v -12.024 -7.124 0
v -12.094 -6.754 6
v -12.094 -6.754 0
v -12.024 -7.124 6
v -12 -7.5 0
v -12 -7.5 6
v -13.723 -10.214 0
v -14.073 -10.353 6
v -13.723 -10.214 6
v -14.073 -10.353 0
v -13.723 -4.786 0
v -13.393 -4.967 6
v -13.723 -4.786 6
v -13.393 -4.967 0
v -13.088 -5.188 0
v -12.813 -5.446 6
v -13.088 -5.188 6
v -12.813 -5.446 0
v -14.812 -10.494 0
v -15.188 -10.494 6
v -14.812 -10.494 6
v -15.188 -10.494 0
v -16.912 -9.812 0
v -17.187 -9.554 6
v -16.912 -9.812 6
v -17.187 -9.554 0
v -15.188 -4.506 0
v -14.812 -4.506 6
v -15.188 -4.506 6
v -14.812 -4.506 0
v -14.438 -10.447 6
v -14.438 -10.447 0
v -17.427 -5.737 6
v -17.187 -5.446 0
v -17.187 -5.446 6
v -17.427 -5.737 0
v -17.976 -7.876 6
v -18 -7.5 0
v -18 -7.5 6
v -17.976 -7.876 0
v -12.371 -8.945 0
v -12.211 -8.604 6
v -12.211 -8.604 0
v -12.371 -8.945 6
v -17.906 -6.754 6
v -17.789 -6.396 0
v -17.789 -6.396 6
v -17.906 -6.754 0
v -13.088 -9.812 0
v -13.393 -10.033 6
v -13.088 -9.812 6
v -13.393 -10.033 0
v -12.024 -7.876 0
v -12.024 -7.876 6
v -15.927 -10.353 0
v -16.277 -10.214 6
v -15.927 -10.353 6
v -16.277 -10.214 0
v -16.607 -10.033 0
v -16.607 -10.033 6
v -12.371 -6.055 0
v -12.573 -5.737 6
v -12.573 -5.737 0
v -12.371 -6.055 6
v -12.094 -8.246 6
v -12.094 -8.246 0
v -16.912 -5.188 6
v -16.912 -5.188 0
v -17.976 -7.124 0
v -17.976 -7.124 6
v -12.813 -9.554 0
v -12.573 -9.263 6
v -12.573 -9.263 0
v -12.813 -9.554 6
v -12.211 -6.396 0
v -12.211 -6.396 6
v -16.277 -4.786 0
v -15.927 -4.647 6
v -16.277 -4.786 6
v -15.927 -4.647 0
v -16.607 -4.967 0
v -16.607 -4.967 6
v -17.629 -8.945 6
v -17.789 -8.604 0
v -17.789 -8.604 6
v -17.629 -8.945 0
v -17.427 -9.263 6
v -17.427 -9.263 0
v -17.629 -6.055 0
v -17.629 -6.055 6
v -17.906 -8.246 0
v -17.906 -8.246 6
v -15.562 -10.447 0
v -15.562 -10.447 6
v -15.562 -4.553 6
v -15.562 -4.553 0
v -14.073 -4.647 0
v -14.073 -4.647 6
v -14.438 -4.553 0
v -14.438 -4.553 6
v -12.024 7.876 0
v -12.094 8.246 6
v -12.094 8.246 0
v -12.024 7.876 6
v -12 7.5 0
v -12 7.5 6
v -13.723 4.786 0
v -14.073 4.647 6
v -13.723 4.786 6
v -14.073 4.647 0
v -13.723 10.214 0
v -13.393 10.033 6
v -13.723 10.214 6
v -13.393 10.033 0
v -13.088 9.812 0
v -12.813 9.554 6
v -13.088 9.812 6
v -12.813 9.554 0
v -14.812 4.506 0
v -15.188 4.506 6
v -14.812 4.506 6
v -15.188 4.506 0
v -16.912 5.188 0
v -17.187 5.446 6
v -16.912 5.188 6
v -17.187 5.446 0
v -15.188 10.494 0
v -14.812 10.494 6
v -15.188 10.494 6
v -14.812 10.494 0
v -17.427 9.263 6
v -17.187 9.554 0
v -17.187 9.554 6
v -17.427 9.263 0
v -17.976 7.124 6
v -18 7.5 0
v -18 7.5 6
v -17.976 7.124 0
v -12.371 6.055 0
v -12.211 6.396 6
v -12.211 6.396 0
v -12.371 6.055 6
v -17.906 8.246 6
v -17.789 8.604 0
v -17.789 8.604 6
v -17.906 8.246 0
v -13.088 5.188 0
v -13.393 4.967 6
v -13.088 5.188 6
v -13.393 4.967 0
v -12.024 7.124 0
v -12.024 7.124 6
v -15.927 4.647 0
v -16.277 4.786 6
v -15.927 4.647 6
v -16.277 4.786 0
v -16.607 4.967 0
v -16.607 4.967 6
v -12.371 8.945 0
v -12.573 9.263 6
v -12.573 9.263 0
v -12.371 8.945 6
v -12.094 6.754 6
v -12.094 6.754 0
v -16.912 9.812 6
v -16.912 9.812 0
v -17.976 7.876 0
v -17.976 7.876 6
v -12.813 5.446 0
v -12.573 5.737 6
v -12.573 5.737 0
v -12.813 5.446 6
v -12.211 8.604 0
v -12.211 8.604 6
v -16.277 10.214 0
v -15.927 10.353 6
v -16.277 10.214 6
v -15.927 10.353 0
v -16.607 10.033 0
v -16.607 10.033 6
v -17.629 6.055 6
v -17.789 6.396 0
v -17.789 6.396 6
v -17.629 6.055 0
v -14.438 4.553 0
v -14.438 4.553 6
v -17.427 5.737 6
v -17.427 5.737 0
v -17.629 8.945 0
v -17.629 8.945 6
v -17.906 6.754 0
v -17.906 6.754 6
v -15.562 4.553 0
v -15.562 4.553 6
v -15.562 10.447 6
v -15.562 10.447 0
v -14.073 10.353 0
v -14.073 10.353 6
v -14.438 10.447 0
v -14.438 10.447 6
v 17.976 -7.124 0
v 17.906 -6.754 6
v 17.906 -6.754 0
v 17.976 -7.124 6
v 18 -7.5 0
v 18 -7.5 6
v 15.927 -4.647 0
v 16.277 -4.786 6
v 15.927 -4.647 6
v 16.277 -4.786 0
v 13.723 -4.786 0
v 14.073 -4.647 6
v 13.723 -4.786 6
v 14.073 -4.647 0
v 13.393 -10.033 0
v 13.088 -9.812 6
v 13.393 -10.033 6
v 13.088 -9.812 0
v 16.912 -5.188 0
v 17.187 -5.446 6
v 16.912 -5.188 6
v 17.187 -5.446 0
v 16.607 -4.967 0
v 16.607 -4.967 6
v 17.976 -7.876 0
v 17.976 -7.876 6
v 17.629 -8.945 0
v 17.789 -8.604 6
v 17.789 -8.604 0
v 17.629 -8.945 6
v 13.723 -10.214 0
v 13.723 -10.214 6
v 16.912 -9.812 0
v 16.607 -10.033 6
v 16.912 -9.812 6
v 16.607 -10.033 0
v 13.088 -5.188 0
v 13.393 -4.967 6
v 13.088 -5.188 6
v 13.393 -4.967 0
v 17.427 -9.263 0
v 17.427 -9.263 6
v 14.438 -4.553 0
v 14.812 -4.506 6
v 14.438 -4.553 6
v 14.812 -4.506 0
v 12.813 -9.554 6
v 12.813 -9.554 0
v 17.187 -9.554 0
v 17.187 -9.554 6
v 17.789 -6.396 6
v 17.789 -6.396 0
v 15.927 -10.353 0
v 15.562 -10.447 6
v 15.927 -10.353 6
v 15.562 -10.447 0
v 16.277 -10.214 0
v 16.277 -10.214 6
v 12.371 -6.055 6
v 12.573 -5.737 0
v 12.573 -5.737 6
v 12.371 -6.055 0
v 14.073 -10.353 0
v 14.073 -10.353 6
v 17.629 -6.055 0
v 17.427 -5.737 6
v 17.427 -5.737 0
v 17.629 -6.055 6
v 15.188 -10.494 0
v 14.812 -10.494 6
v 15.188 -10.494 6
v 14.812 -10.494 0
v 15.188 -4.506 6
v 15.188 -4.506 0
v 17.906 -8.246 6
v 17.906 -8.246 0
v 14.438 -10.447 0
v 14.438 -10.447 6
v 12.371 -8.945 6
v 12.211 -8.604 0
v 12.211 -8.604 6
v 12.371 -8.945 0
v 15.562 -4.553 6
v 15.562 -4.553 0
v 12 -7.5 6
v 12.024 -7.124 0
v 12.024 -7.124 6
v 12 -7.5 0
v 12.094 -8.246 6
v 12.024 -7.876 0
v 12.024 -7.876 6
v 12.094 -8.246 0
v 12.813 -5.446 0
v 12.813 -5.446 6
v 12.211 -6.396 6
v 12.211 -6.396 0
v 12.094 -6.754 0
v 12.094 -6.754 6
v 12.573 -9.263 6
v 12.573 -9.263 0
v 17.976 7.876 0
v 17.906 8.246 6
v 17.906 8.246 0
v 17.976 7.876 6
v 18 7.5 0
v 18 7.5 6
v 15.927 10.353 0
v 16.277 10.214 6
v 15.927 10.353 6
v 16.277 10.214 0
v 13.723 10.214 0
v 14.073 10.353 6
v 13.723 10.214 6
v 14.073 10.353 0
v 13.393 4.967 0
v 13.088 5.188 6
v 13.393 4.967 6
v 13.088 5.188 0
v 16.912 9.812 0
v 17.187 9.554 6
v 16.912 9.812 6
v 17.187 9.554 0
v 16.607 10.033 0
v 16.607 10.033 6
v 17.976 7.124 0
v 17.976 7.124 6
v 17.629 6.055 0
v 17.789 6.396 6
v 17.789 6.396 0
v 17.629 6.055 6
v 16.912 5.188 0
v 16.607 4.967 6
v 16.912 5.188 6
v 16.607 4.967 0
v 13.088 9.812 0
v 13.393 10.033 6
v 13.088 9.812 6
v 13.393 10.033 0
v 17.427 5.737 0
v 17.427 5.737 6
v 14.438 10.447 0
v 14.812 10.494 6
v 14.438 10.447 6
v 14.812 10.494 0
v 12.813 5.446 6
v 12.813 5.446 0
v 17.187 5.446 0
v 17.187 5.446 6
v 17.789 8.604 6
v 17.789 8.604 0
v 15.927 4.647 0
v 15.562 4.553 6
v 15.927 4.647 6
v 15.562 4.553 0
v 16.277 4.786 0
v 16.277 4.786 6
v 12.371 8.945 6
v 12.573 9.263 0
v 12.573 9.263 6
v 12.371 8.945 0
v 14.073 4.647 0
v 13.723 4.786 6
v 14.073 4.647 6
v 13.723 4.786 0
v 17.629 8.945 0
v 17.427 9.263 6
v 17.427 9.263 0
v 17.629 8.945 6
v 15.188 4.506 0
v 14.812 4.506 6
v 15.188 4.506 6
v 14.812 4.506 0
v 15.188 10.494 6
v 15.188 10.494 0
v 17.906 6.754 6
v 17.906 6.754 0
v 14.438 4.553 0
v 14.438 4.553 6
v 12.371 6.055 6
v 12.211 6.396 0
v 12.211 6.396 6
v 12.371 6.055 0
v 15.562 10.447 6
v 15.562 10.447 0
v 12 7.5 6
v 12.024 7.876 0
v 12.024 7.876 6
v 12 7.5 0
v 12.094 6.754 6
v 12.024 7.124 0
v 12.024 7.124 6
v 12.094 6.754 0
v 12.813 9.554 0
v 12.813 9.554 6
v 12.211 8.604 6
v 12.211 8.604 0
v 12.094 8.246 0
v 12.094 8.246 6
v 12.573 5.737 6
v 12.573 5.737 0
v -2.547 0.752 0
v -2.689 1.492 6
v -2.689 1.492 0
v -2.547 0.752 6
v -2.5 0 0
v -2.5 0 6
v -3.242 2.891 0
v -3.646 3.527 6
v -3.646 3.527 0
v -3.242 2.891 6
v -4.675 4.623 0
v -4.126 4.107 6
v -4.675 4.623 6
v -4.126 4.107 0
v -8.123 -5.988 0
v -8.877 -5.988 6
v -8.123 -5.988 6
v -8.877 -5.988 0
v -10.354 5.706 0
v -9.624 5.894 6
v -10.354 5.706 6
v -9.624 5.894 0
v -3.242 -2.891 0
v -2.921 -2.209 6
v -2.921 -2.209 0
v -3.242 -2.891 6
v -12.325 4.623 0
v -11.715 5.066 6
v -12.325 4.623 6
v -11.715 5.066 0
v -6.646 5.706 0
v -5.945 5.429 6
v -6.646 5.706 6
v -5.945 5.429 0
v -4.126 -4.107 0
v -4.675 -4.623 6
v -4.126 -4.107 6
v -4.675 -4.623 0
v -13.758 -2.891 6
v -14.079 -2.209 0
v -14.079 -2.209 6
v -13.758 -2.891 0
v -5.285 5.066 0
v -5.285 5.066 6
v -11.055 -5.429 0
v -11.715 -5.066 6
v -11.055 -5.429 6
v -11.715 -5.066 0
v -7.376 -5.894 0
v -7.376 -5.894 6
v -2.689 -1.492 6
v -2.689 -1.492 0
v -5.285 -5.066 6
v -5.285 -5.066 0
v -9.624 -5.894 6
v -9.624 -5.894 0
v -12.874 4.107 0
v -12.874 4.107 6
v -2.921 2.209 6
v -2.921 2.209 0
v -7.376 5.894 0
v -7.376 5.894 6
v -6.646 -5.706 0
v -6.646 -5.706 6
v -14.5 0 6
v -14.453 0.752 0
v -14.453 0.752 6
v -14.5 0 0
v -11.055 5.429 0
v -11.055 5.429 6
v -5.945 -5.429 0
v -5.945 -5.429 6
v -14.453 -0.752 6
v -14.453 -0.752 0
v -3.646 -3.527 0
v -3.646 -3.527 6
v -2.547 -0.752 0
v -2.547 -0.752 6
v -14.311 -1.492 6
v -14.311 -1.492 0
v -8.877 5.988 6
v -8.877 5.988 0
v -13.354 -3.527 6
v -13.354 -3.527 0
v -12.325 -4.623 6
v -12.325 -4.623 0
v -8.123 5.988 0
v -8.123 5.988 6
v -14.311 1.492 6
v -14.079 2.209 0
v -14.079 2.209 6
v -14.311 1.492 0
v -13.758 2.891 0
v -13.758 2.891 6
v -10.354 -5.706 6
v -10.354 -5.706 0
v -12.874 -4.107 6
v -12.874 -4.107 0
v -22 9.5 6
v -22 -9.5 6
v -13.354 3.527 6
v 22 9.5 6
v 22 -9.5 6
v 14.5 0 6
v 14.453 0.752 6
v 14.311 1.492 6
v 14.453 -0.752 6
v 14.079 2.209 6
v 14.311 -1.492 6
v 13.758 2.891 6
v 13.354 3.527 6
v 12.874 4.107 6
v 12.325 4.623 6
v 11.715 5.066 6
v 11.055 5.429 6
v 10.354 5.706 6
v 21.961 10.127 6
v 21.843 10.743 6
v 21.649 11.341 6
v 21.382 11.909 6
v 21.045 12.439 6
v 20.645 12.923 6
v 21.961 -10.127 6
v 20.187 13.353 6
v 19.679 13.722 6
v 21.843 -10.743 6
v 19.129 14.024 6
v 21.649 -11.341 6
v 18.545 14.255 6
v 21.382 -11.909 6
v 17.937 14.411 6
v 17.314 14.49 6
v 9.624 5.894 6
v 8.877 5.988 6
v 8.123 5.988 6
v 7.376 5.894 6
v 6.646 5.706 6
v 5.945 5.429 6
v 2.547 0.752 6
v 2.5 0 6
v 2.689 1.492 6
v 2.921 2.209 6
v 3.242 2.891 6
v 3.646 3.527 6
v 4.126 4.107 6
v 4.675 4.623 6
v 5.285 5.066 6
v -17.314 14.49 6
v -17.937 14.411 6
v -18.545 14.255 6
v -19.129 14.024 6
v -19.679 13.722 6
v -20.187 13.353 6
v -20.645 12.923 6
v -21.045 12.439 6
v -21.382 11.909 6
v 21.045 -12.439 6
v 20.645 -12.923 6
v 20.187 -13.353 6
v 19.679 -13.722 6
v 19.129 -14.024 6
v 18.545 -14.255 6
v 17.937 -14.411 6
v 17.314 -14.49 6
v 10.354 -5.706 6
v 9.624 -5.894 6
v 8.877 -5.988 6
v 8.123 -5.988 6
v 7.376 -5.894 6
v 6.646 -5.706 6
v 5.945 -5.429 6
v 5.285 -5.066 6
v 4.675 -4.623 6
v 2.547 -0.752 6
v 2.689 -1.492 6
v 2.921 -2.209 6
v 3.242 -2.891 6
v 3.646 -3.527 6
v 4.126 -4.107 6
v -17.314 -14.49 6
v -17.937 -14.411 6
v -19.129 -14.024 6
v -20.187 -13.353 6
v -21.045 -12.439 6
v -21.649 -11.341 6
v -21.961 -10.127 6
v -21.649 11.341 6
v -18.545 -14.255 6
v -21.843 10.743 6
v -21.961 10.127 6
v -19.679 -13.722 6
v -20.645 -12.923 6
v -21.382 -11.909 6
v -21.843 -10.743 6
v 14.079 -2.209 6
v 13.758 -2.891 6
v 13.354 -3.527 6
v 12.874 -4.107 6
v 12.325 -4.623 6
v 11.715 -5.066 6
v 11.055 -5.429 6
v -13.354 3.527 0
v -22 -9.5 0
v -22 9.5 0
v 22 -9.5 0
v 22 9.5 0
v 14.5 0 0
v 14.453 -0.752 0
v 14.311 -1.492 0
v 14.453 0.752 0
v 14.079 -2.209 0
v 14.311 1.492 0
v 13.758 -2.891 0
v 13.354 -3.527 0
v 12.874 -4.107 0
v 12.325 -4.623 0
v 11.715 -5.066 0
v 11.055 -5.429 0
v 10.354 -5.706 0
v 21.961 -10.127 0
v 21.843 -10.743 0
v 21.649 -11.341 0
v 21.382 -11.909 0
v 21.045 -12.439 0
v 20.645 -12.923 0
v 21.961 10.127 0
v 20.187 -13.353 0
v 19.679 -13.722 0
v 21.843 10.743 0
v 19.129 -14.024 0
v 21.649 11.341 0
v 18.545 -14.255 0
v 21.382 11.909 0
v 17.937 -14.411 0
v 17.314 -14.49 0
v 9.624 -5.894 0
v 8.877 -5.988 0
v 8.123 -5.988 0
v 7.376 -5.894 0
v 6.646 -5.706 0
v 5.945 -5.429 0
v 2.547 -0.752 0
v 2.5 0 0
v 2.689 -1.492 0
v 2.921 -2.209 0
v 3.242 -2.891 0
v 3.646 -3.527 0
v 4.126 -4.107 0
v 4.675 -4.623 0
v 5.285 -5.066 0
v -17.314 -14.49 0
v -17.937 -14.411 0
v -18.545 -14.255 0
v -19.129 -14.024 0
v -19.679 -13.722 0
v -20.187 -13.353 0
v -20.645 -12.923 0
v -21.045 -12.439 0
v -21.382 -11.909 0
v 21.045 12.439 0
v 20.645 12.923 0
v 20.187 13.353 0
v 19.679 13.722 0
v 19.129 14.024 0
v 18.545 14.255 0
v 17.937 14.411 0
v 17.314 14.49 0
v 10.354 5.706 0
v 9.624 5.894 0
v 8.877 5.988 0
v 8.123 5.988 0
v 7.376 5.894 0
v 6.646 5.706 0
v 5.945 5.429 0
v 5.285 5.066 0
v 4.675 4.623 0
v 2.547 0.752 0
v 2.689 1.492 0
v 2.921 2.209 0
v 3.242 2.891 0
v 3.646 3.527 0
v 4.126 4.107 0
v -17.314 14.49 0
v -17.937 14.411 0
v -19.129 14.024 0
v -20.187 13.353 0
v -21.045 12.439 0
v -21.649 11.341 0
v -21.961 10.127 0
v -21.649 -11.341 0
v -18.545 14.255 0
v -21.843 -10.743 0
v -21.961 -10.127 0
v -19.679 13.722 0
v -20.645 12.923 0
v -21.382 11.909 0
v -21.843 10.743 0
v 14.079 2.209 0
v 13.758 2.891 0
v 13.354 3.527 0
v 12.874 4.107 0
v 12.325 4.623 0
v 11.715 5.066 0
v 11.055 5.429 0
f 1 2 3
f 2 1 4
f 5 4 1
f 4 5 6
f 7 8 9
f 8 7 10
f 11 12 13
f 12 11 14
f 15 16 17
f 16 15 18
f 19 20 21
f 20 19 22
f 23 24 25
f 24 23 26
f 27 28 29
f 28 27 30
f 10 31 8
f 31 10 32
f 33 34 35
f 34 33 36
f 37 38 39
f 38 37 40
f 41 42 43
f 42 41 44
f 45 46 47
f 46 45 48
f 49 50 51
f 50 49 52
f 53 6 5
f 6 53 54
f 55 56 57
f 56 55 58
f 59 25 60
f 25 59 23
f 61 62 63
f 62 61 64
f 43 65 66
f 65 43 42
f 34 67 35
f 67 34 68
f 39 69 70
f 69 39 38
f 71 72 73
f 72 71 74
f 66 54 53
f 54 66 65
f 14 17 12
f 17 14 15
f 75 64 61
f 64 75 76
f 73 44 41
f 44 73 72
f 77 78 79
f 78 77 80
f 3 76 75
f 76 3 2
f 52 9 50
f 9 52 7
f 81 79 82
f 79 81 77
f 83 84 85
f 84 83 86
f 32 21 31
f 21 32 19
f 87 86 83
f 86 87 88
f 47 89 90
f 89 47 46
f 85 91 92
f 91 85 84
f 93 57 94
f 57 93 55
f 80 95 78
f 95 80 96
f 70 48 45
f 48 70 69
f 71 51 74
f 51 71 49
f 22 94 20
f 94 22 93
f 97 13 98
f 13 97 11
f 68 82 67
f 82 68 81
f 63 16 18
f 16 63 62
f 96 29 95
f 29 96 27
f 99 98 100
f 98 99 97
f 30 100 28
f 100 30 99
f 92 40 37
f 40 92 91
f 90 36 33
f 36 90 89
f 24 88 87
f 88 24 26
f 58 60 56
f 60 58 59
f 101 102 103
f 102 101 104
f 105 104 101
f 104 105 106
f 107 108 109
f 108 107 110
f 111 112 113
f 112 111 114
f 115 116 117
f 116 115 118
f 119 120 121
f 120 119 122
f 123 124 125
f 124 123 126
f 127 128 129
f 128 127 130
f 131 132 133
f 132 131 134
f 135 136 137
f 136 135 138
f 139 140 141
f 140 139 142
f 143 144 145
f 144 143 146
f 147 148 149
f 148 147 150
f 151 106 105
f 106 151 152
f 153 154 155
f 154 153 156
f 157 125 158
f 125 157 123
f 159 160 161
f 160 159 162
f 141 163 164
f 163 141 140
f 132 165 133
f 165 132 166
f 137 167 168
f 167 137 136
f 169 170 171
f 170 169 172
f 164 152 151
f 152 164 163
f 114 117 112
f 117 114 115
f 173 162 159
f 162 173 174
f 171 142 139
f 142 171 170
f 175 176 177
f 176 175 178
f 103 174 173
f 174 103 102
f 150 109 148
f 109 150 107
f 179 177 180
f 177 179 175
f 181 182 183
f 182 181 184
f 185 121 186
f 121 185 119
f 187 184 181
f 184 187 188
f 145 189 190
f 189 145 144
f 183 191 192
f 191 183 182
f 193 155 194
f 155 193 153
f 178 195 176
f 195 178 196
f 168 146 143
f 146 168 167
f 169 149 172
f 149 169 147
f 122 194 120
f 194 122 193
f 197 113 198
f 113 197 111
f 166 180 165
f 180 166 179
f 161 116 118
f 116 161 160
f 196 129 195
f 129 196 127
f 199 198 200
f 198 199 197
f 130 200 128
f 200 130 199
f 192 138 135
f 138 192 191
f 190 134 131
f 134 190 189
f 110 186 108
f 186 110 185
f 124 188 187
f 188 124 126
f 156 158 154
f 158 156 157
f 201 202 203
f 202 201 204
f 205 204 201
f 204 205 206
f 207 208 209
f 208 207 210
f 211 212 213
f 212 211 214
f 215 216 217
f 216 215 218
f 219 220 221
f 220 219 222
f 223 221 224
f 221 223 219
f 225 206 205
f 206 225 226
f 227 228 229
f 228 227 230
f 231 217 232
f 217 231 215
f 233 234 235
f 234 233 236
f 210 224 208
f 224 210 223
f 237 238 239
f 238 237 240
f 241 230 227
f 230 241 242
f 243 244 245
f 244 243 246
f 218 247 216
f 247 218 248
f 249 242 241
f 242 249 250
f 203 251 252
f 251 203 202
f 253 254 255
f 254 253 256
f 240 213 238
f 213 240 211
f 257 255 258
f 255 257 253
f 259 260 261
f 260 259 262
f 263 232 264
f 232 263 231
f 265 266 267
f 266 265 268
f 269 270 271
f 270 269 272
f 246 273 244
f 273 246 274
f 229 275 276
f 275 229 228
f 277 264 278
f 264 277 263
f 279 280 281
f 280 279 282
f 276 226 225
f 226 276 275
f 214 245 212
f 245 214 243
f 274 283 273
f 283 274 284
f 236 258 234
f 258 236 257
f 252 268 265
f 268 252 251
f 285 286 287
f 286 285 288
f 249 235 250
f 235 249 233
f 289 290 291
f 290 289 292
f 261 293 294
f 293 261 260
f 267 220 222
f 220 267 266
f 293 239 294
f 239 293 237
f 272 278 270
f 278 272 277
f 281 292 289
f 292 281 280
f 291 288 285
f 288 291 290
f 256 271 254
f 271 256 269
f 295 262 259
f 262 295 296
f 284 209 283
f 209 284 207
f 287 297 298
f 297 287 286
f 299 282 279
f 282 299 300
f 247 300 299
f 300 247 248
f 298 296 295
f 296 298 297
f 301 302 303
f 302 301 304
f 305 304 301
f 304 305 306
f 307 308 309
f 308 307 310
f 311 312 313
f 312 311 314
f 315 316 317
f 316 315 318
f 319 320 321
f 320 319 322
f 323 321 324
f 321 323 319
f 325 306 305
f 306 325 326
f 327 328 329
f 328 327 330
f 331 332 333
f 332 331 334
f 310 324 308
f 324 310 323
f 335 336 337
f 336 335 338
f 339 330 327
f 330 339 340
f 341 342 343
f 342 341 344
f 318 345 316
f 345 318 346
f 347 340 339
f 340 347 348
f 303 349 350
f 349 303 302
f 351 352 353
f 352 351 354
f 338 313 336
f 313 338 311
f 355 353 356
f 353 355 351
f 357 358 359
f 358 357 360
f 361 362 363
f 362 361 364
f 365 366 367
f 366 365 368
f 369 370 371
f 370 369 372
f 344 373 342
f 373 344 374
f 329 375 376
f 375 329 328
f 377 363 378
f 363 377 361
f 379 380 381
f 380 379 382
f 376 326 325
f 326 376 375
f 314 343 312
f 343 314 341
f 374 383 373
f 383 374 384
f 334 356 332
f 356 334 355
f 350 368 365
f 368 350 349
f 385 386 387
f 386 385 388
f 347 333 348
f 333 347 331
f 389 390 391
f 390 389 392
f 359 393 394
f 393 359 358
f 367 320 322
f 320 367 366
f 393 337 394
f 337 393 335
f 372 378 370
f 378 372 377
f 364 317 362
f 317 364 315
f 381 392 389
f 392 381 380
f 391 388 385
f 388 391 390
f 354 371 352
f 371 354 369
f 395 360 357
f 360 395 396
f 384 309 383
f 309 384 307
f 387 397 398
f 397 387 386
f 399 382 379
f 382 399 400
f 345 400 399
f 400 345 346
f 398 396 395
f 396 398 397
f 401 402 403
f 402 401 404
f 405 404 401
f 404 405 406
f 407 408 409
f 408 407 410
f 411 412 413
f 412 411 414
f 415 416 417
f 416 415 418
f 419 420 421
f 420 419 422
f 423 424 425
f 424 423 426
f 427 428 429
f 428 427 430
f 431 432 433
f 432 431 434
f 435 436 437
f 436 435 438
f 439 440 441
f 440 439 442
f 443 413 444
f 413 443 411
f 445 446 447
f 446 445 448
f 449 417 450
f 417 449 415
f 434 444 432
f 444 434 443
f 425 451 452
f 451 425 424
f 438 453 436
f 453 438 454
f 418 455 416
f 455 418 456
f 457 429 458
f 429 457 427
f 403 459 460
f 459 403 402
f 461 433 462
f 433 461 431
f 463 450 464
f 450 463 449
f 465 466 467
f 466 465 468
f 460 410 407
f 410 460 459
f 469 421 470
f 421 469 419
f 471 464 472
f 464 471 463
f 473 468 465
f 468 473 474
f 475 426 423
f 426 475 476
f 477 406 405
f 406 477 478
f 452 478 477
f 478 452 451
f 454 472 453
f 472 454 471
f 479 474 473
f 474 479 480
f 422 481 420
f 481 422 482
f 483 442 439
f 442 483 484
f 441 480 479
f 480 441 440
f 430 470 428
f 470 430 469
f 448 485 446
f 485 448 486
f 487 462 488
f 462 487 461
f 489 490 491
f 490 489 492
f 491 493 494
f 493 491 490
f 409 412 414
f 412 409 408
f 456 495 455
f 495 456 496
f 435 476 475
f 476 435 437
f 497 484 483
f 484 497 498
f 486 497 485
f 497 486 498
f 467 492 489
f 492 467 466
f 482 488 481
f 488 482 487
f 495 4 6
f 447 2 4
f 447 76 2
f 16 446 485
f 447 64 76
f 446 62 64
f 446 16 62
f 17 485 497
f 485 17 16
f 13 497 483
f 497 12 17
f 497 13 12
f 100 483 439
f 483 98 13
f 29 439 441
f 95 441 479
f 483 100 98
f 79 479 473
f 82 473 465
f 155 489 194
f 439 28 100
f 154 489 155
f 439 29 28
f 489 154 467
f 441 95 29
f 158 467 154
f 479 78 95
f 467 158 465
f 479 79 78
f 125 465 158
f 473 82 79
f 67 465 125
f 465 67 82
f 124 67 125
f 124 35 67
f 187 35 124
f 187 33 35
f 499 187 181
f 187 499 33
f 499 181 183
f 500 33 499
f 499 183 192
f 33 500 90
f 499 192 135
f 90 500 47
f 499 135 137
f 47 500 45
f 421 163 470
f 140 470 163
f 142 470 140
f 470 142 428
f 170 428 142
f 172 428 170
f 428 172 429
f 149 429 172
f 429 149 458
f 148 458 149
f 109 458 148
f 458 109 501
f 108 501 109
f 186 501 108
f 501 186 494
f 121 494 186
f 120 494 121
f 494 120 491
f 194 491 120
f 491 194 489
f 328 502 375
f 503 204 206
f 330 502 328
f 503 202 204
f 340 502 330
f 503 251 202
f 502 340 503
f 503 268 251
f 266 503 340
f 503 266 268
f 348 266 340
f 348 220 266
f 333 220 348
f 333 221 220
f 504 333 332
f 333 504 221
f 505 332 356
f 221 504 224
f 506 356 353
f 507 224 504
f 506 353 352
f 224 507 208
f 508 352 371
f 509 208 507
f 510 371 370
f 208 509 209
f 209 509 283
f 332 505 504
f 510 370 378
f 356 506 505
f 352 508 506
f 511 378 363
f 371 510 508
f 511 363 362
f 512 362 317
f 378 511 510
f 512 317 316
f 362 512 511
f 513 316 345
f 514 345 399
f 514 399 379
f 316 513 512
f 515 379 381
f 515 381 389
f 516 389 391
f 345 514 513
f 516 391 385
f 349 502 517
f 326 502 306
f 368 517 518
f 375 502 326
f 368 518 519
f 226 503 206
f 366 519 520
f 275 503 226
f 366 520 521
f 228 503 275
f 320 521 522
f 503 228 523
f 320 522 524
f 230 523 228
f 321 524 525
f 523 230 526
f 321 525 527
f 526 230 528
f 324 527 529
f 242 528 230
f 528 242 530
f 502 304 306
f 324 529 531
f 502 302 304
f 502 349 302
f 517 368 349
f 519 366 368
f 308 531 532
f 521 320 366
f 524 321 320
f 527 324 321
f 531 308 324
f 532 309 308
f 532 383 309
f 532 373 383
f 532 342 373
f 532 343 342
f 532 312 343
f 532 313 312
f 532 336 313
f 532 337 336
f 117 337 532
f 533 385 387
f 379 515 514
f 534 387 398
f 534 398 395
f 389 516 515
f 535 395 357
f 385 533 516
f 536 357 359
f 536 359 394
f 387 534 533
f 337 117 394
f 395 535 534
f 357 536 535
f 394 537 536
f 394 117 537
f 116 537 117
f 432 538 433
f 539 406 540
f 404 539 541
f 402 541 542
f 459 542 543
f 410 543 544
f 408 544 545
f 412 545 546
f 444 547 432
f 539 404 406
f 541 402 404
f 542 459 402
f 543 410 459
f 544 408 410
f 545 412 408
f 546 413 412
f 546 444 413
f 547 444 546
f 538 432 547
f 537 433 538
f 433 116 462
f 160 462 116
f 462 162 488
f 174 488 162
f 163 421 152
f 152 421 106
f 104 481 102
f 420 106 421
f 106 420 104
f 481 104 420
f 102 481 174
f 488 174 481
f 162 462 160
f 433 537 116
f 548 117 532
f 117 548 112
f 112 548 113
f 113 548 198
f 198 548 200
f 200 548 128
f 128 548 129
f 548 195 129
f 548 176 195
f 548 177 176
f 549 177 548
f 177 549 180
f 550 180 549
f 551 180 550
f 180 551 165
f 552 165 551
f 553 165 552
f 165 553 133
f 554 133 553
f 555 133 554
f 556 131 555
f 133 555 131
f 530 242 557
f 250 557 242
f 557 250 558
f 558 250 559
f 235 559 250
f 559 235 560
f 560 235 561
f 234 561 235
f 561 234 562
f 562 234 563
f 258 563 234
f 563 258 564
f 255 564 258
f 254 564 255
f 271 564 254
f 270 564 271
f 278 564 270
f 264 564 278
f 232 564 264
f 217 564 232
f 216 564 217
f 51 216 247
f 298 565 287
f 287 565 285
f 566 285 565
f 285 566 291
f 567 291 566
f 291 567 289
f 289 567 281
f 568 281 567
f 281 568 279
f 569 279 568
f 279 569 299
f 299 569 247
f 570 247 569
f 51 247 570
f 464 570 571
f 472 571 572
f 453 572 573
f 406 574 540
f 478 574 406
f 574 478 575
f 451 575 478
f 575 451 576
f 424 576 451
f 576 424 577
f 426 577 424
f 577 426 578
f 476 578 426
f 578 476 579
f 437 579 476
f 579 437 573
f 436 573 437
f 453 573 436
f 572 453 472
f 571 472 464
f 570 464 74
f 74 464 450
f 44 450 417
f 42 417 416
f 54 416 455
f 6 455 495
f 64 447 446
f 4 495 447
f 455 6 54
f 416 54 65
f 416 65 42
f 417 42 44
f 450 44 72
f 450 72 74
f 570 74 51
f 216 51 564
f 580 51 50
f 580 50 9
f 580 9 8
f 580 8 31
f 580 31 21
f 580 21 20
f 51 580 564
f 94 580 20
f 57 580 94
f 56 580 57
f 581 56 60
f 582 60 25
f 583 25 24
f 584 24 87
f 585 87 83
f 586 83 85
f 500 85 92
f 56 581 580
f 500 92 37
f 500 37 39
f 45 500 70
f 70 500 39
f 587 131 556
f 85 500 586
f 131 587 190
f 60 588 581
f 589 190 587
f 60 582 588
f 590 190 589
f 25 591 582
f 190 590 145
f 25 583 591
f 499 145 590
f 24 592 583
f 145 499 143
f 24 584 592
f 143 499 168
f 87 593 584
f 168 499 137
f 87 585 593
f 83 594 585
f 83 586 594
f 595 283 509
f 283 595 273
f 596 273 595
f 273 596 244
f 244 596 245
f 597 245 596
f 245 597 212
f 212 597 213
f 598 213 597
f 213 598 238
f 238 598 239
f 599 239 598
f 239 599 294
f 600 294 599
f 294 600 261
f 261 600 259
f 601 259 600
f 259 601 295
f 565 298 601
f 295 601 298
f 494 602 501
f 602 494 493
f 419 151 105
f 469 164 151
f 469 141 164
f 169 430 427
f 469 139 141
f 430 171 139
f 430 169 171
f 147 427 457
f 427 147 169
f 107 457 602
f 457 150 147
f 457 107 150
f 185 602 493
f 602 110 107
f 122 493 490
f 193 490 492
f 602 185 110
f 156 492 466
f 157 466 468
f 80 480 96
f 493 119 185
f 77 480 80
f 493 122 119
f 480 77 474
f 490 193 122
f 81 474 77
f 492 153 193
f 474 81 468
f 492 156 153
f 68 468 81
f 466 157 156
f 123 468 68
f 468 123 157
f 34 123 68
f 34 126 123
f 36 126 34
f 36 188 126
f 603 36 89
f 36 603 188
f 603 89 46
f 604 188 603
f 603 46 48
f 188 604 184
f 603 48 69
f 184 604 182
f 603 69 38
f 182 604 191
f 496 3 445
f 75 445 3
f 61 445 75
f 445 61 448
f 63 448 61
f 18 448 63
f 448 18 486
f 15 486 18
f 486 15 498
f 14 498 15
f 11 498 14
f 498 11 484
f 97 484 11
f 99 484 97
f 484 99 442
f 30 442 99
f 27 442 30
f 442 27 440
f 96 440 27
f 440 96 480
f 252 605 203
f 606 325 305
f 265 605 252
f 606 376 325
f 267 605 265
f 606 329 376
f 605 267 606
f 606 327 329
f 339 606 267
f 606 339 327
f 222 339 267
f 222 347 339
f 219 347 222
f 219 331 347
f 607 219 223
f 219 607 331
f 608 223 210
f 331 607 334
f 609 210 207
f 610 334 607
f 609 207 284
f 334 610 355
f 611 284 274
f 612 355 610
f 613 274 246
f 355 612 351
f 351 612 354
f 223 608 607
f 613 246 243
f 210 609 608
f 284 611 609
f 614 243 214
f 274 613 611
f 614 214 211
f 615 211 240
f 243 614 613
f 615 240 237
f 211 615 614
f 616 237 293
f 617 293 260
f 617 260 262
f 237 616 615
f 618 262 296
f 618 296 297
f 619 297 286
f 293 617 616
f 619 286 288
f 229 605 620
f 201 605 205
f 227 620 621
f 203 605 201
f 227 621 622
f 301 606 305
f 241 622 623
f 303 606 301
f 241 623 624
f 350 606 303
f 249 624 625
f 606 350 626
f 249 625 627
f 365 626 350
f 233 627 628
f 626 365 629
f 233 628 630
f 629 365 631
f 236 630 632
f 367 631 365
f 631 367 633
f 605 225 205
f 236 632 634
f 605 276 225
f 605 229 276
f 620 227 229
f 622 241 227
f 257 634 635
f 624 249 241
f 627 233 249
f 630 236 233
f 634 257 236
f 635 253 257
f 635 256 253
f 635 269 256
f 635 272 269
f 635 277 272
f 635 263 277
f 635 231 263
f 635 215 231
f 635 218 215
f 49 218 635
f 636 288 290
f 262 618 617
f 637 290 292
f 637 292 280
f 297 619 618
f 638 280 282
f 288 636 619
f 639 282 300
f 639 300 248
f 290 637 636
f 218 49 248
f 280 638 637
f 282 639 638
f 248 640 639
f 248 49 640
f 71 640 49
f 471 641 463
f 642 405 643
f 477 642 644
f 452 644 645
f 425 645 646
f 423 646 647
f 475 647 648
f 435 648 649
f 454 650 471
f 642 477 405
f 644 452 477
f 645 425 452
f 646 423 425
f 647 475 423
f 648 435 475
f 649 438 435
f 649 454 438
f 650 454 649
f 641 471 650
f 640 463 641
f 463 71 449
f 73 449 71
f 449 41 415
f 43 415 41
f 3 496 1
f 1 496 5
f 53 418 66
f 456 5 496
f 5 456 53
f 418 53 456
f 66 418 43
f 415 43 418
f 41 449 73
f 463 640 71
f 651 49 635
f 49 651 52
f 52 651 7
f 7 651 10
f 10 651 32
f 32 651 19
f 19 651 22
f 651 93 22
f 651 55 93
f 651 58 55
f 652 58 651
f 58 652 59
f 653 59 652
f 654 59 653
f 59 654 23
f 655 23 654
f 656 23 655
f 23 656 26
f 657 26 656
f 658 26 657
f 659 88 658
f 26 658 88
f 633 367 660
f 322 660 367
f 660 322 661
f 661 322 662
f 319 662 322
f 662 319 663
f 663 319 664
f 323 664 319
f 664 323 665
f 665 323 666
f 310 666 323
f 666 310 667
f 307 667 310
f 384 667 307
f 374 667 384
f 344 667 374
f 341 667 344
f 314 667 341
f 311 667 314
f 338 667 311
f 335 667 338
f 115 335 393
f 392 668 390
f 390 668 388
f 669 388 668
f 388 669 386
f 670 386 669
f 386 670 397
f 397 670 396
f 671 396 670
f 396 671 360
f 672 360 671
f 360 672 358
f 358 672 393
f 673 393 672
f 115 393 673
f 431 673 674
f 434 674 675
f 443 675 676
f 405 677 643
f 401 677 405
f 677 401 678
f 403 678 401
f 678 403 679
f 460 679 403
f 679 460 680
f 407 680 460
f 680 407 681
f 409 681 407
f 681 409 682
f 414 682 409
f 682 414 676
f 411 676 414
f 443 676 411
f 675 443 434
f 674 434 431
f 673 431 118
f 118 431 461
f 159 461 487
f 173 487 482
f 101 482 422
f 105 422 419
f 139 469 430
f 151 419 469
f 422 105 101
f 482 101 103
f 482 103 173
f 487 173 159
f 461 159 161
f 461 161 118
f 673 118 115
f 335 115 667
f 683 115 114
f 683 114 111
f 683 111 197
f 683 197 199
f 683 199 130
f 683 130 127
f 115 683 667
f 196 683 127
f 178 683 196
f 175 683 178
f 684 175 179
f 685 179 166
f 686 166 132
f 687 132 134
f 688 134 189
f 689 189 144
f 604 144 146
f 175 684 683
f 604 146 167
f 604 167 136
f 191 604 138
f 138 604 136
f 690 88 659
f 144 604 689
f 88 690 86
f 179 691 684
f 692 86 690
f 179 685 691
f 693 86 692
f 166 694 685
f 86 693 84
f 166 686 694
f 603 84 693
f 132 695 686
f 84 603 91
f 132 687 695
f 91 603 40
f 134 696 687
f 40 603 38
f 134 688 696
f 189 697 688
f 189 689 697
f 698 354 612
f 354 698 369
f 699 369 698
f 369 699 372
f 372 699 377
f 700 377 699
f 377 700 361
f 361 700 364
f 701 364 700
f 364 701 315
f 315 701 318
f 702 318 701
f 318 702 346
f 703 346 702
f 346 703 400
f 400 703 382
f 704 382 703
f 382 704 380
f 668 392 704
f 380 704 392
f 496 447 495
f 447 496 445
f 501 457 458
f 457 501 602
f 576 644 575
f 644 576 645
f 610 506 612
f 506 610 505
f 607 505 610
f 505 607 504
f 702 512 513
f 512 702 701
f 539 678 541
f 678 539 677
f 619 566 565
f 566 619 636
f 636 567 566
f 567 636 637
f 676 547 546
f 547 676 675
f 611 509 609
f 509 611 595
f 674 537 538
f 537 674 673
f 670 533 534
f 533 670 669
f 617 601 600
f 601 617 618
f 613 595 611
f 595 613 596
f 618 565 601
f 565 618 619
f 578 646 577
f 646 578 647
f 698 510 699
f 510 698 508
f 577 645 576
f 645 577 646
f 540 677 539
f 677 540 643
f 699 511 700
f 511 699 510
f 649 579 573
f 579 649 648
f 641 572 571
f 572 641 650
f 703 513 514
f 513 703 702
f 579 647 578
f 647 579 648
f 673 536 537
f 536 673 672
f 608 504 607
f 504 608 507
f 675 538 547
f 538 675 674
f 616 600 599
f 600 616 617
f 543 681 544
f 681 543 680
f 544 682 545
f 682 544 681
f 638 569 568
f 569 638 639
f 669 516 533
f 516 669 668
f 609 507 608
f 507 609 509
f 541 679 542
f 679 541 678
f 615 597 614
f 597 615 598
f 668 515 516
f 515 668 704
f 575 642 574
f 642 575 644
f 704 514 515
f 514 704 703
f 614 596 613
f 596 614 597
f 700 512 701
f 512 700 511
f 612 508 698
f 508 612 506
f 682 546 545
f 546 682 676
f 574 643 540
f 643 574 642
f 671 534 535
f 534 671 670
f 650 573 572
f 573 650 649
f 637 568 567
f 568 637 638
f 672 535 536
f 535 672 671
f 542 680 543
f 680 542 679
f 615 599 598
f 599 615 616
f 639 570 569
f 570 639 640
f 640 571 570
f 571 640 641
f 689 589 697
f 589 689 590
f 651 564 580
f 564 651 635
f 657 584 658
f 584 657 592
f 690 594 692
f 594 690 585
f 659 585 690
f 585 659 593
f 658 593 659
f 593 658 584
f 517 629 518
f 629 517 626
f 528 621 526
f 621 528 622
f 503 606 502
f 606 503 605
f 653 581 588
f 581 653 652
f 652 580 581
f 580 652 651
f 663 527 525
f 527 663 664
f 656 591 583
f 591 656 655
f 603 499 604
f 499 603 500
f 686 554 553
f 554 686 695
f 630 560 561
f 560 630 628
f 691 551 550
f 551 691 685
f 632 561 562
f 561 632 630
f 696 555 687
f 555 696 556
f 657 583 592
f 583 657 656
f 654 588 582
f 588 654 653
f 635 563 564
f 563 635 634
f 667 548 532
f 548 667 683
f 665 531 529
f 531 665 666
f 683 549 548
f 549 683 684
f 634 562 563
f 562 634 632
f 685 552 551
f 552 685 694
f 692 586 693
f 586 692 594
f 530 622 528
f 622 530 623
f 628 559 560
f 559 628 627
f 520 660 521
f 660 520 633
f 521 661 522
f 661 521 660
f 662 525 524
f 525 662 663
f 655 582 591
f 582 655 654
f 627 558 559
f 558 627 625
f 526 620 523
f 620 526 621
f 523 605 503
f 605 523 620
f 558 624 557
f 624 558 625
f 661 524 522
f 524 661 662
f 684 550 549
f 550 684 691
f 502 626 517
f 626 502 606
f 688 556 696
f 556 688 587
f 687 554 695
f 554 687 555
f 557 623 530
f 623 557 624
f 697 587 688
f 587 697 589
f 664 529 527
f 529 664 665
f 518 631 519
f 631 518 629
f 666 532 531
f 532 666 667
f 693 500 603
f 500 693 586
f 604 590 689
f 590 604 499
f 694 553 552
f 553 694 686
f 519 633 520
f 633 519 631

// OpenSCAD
$fn = 50;


difference() {
	union() {
		hull() {
			translate(v = [-17.0000000000, 9.5000000000, 0]) {
				cylinder(h = 6, r = 5);
			}
			translate(v = [17.0000000000, 9.5000000000, 0]) {
				cylinder(h = 6, r = 5);
			}
			translate(v = [-17.0000000000, -9.5000000000, 0]) {
				cylinder(h = 6, r = 5);
			}
			translate(v = [17.0000000000, -9.5000000000, 0]) {
				cylinder(h = 6, r = 5);
			}
		}
	}
	union() {
		#translate(v = [-15.0000000000, -7.5000000000, -100.0000000000]) {
			cylinder(h = 200, r = 3.0000000000);
		}
		#translate(v = [-15.0000000000, 7.5000000000, -100.0000000000]) {
			cylinder(h = 200, r = 3.0000000000);
		}
		#translate(v = [15.0000000000, -7.5000000000, -100.0000000000]) {
			cylinder(h = 200, r = 3.0000000000);
		}
		#translate(v = [15.0000000000, 7.5000000000, -100.0000000000]) {
			cylinder(h = 200, r = 3.0000000000);
		}
		#translate(v = [-8.5000000000, 0, 0]) {
			cylinder(h = 6, r = 6.0000000000);
		}
		#translate(v = [8.5000000000, 0, 0]) {
			cylinder(h = 6, r = 6.0000000000);
		}
	}
}
